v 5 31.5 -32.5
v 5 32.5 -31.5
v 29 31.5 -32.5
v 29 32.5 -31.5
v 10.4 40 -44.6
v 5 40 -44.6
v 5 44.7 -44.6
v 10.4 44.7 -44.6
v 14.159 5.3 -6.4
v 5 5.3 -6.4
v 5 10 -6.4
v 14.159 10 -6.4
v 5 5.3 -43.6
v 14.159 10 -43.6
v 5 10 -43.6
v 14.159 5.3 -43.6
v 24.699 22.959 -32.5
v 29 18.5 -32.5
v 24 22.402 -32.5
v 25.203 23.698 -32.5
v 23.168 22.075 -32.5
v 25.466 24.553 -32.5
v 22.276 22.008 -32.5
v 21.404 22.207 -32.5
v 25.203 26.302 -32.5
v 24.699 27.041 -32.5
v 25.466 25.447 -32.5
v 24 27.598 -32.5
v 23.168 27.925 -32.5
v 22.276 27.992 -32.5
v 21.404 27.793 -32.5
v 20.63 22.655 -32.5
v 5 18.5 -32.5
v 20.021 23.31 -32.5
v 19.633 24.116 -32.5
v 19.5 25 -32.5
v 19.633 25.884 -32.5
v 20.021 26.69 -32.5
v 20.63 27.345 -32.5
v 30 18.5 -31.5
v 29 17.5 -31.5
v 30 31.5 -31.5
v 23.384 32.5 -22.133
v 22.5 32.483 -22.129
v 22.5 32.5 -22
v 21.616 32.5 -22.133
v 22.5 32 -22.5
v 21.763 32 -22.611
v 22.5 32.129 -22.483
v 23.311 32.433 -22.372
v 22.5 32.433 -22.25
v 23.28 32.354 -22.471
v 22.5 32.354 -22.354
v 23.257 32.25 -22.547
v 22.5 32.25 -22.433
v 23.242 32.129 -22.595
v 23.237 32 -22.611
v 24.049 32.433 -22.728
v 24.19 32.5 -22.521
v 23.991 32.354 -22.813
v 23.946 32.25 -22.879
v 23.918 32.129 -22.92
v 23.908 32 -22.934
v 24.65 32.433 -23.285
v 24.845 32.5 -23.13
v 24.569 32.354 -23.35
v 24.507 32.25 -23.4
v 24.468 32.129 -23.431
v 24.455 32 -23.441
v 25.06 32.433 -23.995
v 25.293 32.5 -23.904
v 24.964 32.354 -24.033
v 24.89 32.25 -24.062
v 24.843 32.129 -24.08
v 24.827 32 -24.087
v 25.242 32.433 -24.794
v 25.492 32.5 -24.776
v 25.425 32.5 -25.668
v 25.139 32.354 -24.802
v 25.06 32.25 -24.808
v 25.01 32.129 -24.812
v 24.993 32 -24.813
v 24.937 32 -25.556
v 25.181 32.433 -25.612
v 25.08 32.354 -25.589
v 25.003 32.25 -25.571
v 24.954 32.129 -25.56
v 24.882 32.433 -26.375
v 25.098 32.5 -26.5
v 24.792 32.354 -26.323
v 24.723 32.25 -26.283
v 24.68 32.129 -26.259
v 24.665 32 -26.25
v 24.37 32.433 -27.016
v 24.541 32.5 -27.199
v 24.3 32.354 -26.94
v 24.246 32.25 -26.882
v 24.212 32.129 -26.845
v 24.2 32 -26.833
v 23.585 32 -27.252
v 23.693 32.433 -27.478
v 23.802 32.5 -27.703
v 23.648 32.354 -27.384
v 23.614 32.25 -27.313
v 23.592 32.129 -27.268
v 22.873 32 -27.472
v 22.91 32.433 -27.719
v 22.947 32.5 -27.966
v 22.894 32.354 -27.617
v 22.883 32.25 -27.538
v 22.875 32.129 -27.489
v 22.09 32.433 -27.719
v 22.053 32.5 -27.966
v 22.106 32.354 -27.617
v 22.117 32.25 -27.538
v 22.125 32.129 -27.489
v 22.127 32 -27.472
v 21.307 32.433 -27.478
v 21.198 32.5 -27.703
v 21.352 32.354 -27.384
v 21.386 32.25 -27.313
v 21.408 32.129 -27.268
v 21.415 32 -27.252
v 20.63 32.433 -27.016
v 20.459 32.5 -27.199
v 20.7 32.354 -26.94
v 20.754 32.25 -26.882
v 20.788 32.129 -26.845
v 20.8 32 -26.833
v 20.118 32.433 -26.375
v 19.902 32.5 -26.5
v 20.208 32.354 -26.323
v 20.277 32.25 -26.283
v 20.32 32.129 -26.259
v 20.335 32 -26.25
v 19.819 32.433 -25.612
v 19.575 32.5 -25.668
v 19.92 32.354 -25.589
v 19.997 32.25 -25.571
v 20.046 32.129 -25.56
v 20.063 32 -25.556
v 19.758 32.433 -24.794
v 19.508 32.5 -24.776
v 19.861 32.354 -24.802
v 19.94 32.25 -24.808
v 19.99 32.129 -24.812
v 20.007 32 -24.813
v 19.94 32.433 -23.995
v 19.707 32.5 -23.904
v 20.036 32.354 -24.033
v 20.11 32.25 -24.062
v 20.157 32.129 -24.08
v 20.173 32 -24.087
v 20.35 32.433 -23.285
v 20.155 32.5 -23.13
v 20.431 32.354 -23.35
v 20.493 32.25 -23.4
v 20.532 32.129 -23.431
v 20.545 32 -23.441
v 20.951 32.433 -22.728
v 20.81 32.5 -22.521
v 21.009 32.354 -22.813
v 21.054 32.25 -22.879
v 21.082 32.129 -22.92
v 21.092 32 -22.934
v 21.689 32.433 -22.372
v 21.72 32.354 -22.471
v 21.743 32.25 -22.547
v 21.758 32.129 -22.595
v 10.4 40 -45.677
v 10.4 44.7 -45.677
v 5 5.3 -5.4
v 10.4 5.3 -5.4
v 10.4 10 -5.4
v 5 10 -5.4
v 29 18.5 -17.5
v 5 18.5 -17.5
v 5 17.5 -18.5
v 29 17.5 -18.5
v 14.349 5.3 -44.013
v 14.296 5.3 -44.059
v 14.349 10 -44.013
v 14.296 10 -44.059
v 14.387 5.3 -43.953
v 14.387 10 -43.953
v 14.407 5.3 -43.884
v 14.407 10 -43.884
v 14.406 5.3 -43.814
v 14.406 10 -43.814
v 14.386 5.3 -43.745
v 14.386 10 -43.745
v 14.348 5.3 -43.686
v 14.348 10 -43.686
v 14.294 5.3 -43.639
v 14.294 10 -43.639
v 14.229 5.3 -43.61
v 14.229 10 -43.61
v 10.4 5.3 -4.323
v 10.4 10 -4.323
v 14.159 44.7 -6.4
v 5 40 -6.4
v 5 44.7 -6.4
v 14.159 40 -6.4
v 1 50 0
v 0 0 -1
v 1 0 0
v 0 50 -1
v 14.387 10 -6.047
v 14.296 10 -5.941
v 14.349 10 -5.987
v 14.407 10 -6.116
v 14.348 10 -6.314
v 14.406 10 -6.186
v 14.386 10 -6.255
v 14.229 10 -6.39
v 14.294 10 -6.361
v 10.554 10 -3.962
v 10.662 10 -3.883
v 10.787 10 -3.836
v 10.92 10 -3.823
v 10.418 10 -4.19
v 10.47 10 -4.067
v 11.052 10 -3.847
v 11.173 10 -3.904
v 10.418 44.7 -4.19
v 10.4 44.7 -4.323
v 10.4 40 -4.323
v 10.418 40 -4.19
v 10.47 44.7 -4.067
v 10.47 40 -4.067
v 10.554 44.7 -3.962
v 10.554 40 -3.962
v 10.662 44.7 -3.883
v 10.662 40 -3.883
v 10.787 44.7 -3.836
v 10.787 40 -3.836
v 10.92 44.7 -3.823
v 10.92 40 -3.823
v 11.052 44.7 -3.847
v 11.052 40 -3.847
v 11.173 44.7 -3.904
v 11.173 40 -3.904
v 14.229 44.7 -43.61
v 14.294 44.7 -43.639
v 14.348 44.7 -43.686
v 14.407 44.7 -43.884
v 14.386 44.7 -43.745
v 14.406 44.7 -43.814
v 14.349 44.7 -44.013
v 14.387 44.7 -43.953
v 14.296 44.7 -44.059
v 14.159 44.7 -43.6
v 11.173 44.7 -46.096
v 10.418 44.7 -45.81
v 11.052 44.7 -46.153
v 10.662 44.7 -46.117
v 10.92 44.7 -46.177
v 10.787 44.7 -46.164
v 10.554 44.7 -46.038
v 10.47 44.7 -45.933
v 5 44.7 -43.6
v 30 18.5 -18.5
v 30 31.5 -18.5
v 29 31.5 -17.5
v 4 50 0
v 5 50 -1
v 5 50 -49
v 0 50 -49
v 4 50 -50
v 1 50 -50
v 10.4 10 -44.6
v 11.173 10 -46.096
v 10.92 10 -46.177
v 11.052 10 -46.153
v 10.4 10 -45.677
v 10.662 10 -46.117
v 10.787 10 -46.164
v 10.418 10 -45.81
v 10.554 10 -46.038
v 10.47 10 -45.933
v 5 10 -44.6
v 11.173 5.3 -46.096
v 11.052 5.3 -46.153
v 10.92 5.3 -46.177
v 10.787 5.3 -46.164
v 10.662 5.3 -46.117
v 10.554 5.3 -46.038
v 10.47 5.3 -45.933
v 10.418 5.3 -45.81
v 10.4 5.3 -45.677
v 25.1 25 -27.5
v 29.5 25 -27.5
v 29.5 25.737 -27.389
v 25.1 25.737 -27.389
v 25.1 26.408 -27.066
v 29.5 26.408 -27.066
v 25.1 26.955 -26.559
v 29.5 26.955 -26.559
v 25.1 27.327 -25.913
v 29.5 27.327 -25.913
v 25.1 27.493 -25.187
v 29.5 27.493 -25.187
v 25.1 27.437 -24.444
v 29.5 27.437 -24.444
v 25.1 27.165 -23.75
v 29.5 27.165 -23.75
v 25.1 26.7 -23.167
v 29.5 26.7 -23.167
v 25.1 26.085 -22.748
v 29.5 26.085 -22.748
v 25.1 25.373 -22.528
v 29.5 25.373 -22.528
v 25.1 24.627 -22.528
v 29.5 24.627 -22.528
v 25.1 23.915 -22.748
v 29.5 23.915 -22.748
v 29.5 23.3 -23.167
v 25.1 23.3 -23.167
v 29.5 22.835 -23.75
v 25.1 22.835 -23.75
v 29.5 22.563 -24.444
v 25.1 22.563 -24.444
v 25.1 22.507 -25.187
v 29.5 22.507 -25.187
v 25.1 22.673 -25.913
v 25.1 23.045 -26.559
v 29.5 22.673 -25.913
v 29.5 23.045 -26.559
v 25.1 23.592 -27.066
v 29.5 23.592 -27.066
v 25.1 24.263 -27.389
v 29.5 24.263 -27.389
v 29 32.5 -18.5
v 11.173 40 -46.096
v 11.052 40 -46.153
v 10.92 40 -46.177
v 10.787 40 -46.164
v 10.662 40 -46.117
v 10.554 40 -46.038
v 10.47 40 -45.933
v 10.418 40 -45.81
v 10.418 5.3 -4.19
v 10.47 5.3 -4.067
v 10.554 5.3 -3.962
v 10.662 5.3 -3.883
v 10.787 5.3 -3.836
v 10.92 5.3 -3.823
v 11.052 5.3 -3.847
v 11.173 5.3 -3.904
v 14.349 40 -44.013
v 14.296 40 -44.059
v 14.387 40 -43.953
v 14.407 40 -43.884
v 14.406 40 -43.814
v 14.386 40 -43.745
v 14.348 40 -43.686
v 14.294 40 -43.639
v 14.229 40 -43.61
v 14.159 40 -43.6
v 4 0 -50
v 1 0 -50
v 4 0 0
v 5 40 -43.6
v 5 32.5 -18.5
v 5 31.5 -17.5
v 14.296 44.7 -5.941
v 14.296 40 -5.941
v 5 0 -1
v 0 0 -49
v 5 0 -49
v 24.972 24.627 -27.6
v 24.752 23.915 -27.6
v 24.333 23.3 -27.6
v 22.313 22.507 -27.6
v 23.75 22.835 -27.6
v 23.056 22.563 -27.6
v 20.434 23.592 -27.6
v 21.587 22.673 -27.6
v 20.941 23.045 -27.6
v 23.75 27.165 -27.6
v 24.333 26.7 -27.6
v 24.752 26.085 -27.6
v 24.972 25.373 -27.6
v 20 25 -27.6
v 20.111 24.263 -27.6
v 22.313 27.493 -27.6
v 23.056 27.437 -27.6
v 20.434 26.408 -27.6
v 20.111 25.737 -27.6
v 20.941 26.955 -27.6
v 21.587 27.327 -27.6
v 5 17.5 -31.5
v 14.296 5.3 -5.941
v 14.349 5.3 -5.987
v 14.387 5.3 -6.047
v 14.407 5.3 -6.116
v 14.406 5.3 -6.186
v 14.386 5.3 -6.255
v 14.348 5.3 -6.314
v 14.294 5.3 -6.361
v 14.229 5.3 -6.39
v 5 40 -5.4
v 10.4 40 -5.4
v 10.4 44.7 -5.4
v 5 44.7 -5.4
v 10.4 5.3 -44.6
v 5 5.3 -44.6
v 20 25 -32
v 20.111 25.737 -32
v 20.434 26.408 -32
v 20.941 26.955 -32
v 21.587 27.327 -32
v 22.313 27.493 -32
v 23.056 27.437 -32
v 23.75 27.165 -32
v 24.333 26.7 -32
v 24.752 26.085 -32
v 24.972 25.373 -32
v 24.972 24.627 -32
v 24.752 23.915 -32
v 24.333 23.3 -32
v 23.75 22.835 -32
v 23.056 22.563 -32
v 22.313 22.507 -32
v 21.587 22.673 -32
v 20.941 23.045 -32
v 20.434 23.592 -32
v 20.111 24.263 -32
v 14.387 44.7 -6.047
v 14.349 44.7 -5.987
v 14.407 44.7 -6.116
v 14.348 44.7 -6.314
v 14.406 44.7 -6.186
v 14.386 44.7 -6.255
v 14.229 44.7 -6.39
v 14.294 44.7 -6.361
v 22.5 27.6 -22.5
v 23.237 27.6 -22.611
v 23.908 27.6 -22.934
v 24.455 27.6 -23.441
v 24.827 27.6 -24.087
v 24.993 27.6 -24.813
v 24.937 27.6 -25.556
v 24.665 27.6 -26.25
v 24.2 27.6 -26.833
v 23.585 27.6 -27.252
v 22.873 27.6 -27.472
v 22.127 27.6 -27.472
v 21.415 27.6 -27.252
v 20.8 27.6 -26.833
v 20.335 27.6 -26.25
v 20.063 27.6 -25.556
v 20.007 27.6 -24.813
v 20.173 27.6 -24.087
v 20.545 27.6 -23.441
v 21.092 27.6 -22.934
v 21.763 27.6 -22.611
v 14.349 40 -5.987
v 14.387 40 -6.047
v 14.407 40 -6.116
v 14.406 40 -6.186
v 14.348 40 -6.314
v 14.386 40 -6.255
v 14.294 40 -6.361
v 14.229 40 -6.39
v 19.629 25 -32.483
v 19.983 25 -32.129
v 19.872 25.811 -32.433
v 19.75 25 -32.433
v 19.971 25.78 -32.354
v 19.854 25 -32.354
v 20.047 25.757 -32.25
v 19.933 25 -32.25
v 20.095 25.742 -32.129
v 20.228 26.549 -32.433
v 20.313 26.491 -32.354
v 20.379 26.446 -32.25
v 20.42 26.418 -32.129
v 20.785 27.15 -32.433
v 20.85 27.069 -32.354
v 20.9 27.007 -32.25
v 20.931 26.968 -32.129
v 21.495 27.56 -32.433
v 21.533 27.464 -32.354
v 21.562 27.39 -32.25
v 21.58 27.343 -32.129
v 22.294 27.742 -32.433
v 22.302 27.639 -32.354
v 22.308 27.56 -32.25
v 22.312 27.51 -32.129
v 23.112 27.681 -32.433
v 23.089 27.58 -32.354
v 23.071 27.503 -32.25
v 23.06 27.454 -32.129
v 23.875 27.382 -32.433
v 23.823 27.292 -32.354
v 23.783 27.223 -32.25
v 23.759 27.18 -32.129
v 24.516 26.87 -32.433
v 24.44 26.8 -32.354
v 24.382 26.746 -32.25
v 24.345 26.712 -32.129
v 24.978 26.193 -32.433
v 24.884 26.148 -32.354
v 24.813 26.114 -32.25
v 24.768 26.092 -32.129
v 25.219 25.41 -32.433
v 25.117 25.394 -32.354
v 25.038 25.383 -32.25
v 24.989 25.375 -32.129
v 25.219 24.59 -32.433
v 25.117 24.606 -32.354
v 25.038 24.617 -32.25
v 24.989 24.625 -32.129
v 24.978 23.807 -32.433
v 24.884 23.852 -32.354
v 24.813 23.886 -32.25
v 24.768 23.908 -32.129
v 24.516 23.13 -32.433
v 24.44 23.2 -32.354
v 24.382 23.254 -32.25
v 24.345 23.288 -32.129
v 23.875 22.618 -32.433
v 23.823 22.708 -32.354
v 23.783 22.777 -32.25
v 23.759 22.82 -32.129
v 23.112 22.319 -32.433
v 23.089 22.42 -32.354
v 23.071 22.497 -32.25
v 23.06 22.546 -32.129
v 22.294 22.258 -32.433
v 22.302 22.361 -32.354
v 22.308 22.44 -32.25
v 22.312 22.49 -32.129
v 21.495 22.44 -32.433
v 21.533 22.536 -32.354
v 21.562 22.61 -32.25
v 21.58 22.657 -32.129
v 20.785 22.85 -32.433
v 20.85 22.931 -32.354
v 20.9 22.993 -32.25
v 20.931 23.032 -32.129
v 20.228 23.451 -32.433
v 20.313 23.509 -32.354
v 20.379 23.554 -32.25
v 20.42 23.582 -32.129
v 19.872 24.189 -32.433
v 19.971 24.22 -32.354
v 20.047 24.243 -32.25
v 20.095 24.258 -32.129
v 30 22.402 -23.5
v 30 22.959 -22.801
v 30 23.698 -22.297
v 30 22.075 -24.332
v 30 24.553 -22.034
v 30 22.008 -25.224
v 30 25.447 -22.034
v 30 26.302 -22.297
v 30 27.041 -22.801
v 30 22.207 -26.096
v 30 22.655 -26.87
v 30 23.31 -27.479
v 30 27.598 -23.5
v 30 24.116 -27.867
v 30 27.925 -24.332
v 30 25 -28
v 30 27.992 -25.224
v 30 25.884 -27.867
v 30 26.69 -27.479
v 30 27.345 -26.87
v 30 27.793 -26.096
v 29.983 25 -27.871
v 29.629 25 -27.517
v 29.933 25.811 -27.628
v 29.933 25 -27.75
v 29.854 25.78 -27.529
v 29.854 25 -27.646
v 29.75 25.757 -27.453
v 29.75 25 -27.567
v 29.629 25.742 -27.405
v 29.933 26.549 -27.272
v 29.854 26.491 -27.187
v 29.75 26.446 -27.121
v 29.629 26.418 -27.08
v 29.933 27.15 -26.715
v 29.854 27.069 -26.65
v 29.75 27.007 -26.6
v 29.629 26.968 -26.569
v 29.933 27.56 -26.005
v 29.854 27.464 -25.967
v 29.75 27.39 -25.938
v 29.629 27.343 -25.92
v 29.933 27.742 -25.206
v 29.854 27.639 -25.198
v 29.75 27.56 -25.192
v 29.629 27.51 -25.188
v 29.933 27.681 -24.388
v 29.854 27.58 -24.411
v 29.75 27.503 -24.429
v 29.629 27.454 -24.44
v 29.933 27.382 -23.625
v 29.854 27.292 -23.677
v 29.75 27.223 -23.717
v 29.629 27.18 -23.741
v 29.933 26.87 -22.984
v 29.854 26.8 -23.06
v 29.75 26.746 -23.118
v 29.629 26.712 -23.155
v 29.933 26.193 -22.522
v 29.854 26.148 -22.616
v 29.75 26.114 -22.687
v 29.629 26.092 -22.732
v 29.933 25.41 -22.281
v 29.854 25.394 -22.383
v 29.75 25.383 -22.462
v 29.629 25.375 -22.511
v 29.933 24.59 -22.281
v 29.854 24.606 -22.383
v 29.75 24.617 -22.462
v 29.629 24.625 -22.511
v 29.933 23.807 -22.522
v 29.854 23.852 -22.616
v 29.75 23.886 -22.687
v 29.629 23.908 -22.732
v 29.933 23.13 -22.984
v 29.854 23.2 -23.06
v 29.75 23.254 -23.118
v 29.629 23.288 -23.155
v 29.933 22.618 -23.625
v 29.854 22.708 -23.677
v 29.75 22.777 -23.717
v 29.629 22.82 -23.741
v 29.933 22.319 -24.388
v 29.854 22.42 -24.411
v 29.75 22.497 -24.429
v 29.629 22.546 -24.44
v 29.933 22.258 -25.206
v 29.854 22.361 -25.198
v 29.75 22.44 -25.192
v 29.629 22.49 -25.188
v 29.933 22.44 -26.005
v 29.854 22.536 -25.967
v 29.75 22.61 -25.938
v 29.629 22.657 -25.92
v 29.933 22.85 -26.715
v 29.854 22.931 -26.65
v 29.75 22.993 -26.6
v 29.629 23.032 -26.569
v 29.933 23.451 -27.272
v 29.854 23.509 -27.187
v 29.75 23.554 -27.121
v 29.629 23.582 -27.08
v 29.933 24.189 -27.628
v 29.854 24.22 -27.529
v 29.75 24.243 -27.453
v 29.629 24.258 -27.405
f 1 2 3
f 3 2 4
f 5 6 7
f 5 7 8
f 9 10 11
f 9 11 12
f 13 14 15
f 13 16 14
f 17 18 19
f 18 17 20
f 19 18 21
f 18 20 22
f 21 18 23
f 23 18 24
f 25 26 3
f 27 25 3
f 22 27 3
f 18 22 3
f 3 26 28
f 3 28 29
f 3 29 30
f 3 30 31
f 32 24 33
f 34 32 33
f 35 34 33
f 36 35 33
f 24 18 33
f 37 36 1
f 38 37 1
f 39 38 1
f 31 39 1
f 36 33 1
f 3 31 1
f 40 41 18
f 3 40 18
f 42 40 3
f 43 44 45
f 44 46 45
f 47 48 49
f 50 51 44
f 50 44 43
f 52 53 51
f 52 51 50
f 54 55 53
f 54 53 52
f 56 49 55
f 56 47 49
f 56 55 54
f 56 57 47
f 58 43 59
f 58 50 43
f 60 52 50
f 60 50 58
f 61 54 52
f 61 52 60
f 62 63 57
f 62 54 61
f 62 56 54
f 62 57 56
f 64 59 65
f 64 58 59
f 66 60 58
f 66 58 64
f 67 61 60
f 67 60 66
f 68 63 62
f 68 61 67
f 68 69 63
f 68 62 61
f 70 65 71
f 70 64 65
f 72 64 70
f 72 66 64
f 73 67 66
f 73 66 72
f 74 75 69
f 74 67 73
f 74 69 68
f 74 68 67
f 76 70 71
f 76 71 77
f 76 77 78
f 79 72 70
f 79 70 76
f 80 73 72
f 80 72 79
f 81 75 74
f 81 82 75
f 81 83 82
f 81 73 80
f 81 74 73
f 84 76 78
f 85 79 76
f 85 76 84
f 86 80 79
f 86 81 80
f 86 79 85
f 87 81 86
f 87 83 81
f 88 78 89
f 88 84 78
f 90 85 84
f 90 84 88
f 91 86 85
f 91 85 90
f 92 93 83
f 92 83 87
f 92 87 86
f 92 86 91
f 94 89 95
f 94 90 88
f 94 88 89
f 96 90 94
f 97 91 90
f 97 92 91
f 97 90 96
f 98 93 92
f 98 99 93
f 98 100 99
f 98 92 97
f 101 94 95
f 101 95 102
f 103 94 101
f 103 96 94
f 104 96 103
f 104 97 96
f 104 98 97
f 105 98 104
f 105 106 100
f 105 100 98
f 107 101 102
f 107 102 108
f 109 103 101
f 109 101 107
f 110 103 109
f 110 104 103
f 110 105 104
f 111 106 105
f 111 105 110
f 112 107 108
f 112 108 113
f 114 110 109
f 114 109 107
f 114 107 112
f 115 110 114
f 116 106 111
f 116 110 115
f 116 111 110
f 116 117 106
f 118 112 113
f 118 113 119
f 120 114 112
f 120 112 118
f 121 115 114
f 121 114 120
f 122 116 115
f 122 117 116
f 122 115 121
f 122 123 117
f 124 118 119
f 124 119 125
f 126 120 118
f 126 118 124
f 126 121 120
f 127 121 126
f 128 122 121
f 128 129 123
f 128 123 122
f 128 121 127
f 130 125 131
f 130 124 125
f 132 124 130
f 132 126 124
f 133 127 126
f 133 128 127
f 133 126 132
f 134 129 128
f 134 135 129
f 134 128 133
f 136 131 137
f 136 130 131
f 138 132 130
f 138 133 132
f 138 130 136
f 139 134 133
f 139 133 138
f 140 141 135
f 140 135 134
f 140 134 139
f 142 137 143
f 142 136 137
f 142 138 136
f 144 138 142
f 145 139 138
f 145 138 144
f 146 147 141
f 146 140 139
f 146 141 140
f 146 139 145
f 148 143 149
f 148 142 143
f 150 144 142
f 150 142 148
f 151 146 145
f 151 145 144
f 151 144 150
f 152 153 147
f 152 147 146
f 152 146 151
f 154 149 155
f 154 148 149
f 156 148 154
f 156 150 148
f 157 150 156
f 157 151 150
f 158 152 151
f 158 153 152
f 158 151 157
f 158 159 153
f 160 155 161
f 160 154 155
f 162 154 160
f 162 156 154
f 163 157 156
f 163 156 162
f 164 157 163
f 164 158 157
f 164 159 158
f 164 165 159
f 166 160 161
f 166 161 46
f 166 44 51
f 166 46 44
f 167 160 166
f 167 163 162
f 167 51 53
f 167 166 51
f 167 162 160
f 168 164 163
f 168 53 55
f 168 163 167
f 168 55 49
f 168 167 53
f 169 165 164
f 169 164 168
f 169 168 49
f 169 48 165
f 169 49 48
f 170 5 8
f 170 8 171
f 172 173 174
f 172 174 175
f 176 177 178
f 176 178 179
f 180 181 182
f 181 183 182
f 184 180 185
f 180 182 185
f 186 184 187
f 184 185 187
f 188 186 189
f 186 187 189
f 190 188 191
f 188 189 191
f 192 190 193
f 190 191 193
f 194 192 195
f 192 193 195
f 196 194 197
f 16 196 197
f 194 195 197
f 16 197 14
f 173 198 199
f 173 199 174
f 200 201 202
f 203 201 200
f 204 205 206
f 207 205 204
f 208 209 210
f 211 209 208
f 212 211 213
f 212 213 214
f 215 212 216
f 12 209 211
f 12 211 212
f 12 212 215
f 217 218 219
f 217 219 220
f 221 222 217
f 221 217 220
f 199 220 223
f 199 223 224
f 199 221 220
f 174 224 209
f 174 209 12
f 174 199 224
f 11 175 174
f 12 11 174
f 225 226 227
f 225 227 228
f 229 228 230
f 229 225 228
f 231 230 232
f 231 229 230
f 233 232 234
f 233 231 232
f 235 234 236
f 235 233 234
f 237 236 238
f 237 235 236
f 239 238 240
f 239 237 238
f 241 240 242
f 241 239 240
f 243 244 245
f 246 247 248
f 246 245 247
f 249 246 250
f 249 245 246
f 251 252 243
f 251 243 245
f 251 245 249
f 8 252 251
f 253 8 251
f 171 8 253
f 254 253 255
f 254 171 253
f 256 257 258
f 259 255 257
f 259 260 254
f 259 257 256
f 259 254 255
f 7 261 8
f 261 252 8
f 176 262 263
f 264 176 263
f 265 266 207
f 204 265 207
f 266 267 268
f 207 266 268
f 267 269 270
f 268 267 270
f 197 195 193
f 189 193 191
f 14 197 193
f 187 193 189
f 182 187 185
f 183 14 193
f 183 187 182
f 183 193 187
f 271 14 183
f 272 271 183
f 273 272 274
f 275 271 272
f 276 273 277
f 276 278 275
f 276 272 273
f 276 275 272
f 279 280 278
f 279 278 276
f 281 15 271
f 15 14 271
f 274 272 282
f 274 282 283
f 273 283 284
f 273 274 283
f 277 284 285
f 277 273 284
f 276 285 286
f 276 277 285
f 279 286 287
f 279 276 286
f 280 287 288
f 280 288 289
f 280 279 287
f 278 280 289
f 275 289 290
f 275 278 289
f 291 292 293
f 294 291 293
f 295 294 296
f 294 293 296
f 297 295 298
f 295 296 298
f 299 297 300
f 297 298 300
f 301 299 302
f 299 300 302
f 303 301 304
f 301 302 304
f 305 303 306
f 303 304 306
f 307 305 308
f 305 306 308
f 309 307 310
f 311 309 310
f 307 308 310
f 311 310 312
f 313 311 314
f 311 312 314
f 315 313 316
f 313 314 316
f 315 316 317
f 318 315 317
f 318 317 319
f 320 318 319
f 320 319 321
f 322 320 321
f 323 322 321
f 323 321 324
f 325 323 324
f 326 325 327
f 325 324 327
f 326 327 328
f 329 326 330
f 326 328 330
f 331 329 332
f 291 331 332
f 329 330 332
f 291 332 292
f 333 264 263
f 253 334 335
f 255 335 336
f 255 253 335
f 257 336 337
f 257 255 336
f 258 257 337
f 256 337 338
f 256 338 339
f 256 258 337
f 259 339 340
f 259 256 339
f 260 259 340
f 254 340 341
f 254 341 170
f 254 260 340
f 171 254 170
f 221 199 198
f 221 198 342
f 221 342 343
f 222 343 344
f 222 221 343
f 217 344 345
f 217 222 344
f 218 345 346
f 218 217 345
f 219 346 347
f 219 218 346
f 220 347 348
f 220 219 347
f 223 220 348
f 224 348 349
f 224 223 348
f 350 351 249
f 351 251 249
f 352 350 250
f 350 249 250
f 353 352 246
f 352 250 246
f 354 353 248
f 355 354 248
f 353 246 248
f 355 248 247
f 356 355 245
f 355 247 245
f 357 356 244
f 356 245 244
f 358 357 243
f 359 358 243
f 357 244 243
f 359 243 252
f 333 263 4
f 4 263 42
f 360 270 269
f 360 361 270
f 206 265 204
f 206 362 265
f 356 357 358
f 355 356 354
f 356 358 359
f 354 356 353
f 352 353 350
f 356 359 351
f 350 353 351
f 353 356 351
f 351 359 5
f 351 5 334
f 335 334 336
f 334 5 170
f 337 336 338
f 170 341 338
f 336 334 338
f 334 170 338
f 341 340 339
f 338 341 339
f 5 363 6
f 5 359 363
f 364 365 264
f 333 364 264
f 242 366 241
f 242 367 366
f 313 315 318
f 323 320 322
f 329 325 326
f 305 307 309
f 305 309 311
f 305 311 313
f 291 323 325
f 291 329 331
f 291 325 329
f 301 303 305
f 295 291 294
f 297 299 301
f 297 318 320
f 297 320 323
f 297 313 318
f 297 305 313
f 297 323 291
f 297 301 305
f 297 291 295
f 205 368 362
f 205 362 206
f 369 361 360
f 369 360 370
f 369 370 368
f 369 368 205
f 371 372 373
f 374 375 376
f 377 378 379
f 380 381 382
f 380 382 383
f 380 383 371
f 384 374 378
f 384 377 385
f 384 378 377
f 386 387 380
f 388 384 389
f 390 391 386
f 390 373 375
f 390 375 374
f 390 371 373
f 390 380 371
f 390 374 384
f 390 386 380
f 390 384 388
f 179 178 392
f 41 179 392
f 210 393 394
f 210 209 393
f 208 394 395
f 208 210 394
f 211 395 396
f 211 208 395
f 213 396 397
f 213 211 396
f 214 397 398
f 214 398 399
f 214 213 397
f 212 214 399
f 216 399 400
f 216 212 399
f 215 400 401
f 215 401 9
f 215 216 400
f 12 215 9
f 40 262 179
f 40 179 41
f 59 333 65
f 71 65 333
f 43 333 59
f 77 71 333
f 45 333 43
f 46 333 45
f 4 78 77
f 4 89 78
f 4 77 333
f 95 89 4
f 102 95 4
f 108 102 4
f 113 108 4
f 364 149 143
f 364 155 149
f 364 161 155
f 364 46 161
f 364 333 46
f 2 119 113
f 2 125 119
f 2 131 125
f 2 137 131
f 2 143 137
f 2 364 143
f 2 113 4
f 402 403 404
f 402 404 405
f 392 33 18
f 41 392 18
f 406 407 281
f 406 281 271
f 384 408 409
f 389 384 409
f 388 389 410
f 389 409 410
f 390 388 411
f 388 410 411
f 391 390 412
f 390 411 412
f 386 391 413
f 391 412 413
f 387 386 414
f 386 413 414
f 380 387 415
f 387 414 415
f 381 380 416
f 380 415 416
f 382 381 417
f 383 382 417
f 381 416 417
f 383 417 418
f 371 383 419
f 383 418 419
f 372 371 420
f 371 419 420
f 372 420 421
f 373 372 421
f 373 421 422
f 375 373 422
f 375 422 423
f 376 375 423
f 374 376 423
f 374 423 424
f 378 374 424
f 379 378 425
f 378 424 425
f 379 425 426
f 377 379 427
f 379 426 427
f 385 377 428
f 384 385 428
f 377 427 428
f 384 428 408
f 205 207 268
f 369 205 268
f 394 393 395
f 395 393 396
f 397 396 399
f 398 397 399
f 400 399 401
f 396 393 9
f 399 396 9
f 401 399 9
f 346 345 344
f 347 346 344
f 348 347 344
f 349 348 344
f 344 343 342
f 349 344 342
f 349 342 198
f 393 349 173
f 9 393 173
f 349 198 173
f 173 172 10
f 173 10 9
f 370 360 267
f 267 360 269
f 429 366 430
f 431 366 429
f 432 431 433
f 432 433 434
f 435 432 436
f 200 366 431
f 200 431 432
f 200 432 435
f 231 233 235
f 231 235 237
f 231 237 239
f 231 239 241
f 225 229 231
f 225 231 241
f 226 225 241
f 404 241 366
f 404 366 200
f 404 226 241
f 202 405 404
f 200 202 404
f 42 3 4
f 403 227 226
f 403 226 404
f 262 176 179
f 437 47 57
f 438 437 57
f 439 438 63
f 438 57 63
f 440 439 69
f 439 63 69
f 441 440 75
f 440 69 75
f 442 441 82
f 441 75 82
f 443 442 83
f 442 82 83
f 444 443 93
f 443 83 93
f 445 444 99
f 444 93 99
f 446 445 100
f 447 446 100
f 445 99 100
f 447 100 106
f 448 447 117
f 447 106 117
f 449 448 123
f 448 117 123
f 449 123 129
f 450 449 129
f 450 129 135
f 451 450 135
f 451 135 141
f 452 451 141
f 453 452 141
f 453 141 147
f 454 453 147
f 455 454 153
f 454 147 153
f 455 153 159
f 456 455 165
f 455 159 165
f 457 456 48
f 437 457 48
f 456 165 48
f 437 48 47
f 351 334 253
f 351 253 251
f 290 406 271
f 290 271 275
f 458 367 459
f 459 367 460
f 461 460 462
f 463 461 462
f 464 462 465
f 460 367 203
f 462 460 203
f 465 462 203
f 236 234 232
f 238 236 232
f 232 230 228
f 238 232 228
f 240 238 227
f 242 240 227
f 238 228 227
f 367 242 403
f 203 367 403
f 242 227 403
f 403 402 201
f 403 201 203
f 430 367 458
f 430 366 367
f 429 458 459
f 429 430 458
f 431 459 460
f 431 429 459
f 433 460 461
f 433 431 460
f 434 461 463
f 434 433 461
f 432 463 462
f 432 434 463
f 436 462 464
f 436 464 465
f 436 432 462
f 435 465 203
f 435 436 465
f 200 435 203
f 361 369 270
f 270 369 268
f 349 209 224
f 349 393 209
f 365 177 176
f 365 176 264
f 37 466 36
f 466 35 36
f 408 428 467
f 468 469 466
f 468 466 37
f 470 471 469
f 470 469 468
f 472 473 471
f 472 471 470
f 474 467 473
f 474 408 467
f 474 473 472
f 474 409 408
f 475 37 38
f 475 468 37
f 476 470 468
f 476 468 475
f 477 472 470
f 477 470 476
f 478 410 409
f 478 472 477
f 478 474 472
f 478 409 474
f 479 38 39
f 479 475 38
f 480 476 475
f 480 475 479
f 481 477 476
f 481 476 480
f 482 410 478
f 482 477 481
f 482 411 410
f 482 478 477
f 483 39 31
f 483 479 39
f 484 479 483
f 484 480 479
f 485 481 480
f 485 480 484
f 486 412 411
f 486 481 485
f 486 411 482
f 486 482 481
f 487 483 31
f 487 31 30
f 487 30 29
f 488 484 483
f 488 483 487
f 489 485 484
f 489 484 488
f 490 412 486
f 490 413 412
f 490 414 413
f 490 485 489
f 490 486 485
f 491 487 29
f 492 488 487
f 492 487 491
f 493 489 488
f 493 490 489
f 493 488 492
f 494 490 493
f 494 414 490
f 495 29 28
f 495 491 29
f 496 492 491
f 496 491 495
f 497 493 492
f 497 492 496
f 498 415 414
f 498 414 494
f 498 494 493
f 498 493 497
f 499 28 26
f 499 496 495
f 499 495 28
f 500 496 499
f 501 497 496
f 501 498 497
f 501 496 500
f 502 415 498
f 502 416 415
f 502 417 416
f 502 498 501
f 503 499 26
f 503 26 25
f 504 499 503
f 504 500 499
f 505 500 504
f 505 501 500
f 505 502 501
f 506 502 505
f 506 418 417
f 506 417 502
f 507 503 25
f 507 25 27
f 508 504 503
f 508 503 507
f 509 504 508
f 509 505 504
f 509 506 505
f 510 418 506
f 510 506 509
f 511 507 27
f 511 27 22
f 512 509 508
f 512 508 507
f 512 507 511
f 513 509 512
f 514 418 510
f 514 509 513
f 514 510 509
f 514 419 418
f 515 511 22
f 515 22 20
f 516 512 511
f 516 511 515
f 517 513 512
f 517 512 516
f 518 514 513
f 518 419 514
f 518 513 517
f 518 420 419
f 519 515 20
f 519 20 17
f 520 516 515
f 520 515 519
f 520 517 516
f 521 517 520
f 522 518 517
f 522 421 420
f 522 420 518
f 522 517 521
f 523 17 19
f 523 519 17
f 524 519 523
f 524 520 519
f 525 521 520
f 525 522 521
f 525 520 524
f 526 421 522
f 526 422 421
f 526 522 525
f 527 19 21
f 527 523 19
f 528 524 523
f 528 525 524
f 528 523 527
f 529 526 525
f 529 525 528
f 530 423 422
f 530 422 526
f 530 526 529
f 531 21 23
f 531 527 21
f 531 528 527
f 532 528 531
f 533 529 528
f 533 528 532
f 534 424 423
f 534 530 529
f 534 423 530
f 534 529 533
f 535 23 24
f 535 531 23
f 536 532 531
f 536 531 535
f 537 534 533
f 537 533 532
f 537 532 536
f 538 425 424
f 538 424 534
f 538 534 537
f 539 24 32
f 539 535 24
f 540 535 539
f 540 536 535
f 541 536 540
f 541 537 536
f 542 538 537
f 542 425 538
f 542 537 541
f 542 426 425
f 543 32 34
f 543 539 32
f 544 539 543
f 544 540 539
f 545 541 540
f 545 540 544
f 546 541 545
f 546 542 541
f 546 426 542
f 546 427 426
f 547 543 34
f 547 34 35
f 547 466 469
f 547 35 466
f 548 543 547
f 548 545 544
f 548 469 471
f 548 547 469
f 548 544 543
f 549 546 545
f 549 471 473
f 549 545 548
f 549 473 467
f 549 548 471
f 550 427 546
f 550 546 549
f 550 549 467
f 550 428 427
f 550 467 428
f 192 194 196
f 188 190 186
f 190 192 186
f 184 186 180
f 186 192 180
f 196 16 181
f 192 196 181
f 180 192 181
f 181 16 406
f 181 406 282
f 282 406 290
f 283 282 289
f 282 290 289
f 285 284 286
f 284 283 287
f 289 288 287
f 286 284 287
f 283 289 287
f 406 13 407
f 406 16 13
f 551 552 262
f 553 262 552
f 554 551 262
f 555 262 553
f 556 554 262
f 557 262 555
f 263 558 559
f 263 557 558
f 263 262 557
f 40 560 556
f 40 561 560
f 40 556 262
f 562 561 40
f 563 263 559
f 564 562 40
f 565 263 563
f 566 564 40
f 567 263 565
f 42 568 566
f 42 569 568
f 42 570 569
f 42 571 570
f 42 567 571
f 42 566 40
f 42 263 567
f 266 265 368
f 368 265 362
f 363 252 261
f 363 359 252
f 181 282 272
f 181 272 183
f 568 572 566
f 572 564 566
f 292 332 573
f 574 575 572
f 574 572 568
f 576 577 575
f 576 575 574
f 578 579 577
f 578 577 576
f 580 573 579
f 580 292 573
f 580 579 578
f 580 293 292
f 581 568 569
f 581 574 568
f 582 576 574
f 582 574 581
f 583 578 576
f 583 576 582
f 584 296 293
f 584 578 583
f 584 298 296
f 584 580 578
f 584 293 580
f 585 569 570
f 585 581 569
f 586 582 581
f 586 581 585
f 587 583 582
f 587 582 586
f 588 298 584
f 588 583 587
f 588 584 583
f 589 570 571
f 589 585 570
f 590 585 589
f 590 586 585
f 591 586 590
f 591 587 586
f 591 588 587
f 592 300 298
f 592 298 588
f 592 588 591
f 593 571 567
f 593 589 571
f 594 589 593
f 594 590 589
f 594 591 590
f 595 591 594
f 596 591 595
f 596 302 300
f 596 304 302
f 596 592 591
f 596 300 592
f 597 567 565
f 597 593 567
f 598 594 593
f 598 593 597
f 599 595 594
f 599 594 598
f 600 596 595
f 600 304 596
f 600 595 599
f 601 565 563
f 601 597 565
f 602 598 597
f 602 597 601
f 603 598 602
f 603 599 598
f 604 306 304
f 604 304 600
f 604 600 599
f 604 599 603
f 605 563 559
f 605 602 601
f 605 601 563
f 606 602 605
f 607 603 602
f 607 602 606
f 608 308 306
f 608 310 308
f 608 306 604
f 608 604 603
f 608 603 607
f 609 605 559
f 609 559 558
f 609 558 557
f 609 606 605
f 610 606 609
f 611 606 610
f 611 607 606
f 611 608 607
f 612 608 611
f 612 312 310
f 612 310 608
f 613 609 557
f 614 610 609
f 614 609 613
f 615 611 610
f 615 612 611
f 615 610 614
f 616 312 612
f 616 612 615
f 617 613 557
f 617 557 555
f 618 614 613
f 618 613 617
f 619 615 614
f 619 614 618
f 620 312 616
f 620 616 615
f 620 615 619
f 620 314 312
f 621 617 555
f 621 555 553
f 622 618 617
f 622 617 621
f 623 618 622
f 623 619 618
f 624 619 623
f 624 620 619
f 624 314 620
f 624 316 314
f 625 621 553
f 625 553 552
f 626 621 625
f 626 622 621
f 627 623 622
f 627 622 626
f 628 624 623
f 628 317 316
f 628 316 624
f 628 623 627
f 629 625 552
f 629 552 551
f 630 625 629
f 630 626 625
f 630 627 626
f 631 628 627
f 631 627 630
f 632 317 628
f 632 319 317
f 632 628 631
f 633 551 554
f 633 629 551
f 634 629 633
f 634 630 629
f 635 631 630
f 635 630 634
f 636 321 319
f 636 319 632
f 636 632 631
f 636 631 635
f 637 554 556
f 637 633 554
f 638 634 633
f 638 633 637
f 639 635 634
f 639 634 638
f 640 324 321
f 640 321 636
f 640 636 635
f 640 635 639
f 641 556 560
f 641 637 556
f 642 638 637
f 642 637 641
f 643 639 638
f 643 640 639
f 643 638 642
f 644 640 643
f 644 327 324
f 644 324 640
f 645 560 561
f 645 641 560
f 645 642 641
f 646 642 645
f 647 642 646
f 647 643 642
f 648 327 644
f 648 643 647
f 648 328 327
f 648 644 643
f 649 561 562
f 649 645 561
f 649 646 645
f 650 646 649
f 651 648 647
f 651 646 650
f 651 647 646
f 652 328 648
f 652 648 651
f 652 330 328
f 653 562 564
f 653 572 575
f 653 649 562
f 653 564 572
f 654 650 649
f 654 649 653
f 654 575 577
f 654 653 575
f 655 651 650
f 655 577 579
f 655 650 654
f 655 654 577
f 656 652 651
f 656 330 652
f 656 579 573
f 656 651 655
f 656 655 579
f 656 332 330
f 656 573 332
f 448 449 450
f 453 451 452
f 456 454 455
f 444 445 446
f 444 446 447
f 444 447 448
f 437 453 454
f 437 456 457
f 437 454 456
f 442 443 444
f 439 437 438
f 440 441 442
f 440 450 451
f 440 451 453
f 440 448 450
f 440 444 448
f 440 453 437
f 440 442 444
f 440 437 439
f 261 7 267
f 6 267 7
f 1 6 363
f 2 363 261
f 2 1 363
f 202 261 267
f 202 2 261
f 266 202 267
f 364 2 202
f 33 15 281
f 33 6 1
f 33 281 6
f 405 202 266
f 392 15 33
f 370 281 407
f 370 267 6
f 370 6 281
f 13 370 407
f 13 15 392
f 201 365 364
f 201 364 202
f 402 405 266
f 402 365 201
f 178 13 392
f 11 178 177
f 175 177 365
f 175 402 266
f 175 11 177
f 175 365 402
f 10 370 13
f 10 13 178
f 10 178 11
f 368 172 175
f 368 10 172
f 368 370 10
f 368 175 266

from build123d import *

# Parameters (mm, degrees)
BOSS_EXTRUDE2_DEPTH = 50
SKETCH17_W          = 50
SKETCH17_H          = 5.3
CUT_EXTRUDE5_DEPTH  = 72.414284285
FILLET2_R           = 0.5
SKETCH33_W          = 15
SKETCH33_H          = 15
BOSS_EXTRUDE4_DEPTH = 25
SKETCH34_R          = 2.5
CUT_EXTRUDE13_DEPTH = 4.9
SKETCH37_R          = 2.5
CUT_EXTRUDE14_DEPTH = 4.9
SKETCH38_R          = 2.5
CUT_EXTRUDE15_DEPTH = 4.9
CHAMFER2_SIZE       = 1
FILLET3_R           = 0.5
CHAMFER3_SIZE       = 1
SKETCH40_W          = 10
SKETCH40_H          = 30
CUT_EXTRUDE17_DEPTH = 76
FILLET4_R           = 0.25


with BuildPart() as part:
    # Sketch3 → Boss-Extrude2 (new body)
    with BuildSketch(Plane(origin=(0, 0, 0), x_dir=(1, 0, 0), z_dir=(0, 1, 0))):
        Polygon((5, 44.6), (10.4, 44.6), (10.4, 46.6), (15, 43.6), (5, 43.6), (5, 6.4), (15, 6.4), (10.4, 3.4), (10.4, 5.4), (5, 5.4), (5, 0), (0, 0), (0, 50), (5, 50), align=None)
    extrude(amount=BOSS_EXTRUDE2_DEPTH)

    # Sketch17 → Cut-Extrude5 (cut, through all)
    with BuildSketch(Plane(origin=(5, 0, 0), x_dir=(0, 0, -1), z_dir=(1, 0, 0))):
        with Locations((25, 2.65)):
            Rectangle(SKETCH17_W, SKETCH17_H)
        with Locations((25, 47.35)):
            Rectangle(SKETCH17_W, SKETCH17_H)
    extrude(amount=CUT_EXTRUDE5_DEPTH, mode=Mode.SUBTRACT)

    # Fillet2
    fillet2_edges = [part.edges().sort_by_distance(p)[0] for p in [
        (10.4, 25, -46.6),
        (10.4, 25, -3.4),
    ]]
    fillet(fillet2_edges, radius=FILLET2_R)

    # Sketch33 → Boss-Extrude4 (add)
    with BuildSketch(Plane(origin=(5, 0, 0), x_dir=(0, 0, -1), z_dir=(1, 0, 0))):
        with Locations((25, 25)):
            Rectangle(SKETCH33_W, SKETCH33_H)
    extrude(amount=BOSS_EXTRUDE4_DEPTH)

    # Sketch34 → Cut-Extrude13 (cut)
    with BuildSketch(Plane(origin=(0, 32.5, 0), x_dir=(1, 0, 0), z_dir=(0, 1, 0))):
        with Locations((22.5, 25)):
            Circle(SKETCH34_R)
    extrude(amount=-CUT_EXTRUDE13_DEPTH, mode=Mode.SUBTRACT)

    # Sketch37 → Cut-Extrude14 (cut)
    with BuildSketch(Plane(origin=(30, 0, 0), x_dir=(0, 0, -1), z_dir=(1, 0, 0))):
        with Locations((25, 25)):
            Circle(SKETCH37_R)
    extrude(amount=-CUT_EXTRUDE14_DEPTH, mode=Mode.SUBTRACT)

    # Sketch38 → Cut-Extrude15 (cut)
    with BuildSketch(Plane(origin=(0, 0, -32.5), x_dir=(-1, 0, 0), z_dir=(0, 0, -1))):
        with Locations((-22.5, 25)):
            Circle(SKETCH38_R)
    extrude(amount=-CUT_EXTRUDE15_DEPTH, mode=Mode.SUBTRACT)

    # Chamfer2
    chamfer2_edges = [part.edges().sort_by_distance(p)[0] for p in [
        (17.5, 32.5, -32.5),
        (17.5, 17.5, -32.5),
        (17.5, 17.5, -17.5),
        (17.5, 32.5, -17.5),
        (30, 17.5, -25),
        (30, 25, -32.5),
        (30, 32.5, -25),
        (30, 25, -17.5),
    ]]
    chamfer(chamfer2_edges, length=CHAMFER2_SIZE)

    # Fillet3
    fillet3_edges = [part.edges().sort_by_distance(p)[0] for p in [
        (20, 32.5, -25),
        (30, 25, -22.5),
        (25, 25, -32.5),
    ]]
    fillet(fillet3_edges, radius=FILLET3_R)

    # Chamfer3
    chamfer3_edges = [part.edges().sort_by_distance(p)[0] for p in [
        (5, 25, 0),
        (0, 25, 0),
        (5, 25, -50),
        (0, 25, -50),
    ]]
    chamfer(chamfer3_edges, length=CHAMFER3_SIZE)

    # Sketch40 → Cut-Extrude17 (cut, through all)
    with BuildSketch(Plane(origin=(5, 0, 0), x_dir=(0, 0, -1), z_dir=(1, 0, 0))):
        with Locations((6, 25)):
            Rectangle(SKETCH40_W, SKETCH40_H)
        with Locations((44, 25)):
            Rectangle(SKETCH40_W, SKETCH40_H)
    extrude(amount=CUT_EXTRUDE17_DEPTH, mode=Mode.SUBTRACT)

    # Fillet4
    fillet4_edges = [part.edges().sort_by_distance(p)[0] for p in [
        (15, 42.35, -43.6),
        (15, 42.35, -6.4),
        (15, 7.65, -6.4),
        (15, 7.65, -43.6),
    ]]
    fillet(fillet4_edges, radius=FILLET4_R)


solid = part.part
